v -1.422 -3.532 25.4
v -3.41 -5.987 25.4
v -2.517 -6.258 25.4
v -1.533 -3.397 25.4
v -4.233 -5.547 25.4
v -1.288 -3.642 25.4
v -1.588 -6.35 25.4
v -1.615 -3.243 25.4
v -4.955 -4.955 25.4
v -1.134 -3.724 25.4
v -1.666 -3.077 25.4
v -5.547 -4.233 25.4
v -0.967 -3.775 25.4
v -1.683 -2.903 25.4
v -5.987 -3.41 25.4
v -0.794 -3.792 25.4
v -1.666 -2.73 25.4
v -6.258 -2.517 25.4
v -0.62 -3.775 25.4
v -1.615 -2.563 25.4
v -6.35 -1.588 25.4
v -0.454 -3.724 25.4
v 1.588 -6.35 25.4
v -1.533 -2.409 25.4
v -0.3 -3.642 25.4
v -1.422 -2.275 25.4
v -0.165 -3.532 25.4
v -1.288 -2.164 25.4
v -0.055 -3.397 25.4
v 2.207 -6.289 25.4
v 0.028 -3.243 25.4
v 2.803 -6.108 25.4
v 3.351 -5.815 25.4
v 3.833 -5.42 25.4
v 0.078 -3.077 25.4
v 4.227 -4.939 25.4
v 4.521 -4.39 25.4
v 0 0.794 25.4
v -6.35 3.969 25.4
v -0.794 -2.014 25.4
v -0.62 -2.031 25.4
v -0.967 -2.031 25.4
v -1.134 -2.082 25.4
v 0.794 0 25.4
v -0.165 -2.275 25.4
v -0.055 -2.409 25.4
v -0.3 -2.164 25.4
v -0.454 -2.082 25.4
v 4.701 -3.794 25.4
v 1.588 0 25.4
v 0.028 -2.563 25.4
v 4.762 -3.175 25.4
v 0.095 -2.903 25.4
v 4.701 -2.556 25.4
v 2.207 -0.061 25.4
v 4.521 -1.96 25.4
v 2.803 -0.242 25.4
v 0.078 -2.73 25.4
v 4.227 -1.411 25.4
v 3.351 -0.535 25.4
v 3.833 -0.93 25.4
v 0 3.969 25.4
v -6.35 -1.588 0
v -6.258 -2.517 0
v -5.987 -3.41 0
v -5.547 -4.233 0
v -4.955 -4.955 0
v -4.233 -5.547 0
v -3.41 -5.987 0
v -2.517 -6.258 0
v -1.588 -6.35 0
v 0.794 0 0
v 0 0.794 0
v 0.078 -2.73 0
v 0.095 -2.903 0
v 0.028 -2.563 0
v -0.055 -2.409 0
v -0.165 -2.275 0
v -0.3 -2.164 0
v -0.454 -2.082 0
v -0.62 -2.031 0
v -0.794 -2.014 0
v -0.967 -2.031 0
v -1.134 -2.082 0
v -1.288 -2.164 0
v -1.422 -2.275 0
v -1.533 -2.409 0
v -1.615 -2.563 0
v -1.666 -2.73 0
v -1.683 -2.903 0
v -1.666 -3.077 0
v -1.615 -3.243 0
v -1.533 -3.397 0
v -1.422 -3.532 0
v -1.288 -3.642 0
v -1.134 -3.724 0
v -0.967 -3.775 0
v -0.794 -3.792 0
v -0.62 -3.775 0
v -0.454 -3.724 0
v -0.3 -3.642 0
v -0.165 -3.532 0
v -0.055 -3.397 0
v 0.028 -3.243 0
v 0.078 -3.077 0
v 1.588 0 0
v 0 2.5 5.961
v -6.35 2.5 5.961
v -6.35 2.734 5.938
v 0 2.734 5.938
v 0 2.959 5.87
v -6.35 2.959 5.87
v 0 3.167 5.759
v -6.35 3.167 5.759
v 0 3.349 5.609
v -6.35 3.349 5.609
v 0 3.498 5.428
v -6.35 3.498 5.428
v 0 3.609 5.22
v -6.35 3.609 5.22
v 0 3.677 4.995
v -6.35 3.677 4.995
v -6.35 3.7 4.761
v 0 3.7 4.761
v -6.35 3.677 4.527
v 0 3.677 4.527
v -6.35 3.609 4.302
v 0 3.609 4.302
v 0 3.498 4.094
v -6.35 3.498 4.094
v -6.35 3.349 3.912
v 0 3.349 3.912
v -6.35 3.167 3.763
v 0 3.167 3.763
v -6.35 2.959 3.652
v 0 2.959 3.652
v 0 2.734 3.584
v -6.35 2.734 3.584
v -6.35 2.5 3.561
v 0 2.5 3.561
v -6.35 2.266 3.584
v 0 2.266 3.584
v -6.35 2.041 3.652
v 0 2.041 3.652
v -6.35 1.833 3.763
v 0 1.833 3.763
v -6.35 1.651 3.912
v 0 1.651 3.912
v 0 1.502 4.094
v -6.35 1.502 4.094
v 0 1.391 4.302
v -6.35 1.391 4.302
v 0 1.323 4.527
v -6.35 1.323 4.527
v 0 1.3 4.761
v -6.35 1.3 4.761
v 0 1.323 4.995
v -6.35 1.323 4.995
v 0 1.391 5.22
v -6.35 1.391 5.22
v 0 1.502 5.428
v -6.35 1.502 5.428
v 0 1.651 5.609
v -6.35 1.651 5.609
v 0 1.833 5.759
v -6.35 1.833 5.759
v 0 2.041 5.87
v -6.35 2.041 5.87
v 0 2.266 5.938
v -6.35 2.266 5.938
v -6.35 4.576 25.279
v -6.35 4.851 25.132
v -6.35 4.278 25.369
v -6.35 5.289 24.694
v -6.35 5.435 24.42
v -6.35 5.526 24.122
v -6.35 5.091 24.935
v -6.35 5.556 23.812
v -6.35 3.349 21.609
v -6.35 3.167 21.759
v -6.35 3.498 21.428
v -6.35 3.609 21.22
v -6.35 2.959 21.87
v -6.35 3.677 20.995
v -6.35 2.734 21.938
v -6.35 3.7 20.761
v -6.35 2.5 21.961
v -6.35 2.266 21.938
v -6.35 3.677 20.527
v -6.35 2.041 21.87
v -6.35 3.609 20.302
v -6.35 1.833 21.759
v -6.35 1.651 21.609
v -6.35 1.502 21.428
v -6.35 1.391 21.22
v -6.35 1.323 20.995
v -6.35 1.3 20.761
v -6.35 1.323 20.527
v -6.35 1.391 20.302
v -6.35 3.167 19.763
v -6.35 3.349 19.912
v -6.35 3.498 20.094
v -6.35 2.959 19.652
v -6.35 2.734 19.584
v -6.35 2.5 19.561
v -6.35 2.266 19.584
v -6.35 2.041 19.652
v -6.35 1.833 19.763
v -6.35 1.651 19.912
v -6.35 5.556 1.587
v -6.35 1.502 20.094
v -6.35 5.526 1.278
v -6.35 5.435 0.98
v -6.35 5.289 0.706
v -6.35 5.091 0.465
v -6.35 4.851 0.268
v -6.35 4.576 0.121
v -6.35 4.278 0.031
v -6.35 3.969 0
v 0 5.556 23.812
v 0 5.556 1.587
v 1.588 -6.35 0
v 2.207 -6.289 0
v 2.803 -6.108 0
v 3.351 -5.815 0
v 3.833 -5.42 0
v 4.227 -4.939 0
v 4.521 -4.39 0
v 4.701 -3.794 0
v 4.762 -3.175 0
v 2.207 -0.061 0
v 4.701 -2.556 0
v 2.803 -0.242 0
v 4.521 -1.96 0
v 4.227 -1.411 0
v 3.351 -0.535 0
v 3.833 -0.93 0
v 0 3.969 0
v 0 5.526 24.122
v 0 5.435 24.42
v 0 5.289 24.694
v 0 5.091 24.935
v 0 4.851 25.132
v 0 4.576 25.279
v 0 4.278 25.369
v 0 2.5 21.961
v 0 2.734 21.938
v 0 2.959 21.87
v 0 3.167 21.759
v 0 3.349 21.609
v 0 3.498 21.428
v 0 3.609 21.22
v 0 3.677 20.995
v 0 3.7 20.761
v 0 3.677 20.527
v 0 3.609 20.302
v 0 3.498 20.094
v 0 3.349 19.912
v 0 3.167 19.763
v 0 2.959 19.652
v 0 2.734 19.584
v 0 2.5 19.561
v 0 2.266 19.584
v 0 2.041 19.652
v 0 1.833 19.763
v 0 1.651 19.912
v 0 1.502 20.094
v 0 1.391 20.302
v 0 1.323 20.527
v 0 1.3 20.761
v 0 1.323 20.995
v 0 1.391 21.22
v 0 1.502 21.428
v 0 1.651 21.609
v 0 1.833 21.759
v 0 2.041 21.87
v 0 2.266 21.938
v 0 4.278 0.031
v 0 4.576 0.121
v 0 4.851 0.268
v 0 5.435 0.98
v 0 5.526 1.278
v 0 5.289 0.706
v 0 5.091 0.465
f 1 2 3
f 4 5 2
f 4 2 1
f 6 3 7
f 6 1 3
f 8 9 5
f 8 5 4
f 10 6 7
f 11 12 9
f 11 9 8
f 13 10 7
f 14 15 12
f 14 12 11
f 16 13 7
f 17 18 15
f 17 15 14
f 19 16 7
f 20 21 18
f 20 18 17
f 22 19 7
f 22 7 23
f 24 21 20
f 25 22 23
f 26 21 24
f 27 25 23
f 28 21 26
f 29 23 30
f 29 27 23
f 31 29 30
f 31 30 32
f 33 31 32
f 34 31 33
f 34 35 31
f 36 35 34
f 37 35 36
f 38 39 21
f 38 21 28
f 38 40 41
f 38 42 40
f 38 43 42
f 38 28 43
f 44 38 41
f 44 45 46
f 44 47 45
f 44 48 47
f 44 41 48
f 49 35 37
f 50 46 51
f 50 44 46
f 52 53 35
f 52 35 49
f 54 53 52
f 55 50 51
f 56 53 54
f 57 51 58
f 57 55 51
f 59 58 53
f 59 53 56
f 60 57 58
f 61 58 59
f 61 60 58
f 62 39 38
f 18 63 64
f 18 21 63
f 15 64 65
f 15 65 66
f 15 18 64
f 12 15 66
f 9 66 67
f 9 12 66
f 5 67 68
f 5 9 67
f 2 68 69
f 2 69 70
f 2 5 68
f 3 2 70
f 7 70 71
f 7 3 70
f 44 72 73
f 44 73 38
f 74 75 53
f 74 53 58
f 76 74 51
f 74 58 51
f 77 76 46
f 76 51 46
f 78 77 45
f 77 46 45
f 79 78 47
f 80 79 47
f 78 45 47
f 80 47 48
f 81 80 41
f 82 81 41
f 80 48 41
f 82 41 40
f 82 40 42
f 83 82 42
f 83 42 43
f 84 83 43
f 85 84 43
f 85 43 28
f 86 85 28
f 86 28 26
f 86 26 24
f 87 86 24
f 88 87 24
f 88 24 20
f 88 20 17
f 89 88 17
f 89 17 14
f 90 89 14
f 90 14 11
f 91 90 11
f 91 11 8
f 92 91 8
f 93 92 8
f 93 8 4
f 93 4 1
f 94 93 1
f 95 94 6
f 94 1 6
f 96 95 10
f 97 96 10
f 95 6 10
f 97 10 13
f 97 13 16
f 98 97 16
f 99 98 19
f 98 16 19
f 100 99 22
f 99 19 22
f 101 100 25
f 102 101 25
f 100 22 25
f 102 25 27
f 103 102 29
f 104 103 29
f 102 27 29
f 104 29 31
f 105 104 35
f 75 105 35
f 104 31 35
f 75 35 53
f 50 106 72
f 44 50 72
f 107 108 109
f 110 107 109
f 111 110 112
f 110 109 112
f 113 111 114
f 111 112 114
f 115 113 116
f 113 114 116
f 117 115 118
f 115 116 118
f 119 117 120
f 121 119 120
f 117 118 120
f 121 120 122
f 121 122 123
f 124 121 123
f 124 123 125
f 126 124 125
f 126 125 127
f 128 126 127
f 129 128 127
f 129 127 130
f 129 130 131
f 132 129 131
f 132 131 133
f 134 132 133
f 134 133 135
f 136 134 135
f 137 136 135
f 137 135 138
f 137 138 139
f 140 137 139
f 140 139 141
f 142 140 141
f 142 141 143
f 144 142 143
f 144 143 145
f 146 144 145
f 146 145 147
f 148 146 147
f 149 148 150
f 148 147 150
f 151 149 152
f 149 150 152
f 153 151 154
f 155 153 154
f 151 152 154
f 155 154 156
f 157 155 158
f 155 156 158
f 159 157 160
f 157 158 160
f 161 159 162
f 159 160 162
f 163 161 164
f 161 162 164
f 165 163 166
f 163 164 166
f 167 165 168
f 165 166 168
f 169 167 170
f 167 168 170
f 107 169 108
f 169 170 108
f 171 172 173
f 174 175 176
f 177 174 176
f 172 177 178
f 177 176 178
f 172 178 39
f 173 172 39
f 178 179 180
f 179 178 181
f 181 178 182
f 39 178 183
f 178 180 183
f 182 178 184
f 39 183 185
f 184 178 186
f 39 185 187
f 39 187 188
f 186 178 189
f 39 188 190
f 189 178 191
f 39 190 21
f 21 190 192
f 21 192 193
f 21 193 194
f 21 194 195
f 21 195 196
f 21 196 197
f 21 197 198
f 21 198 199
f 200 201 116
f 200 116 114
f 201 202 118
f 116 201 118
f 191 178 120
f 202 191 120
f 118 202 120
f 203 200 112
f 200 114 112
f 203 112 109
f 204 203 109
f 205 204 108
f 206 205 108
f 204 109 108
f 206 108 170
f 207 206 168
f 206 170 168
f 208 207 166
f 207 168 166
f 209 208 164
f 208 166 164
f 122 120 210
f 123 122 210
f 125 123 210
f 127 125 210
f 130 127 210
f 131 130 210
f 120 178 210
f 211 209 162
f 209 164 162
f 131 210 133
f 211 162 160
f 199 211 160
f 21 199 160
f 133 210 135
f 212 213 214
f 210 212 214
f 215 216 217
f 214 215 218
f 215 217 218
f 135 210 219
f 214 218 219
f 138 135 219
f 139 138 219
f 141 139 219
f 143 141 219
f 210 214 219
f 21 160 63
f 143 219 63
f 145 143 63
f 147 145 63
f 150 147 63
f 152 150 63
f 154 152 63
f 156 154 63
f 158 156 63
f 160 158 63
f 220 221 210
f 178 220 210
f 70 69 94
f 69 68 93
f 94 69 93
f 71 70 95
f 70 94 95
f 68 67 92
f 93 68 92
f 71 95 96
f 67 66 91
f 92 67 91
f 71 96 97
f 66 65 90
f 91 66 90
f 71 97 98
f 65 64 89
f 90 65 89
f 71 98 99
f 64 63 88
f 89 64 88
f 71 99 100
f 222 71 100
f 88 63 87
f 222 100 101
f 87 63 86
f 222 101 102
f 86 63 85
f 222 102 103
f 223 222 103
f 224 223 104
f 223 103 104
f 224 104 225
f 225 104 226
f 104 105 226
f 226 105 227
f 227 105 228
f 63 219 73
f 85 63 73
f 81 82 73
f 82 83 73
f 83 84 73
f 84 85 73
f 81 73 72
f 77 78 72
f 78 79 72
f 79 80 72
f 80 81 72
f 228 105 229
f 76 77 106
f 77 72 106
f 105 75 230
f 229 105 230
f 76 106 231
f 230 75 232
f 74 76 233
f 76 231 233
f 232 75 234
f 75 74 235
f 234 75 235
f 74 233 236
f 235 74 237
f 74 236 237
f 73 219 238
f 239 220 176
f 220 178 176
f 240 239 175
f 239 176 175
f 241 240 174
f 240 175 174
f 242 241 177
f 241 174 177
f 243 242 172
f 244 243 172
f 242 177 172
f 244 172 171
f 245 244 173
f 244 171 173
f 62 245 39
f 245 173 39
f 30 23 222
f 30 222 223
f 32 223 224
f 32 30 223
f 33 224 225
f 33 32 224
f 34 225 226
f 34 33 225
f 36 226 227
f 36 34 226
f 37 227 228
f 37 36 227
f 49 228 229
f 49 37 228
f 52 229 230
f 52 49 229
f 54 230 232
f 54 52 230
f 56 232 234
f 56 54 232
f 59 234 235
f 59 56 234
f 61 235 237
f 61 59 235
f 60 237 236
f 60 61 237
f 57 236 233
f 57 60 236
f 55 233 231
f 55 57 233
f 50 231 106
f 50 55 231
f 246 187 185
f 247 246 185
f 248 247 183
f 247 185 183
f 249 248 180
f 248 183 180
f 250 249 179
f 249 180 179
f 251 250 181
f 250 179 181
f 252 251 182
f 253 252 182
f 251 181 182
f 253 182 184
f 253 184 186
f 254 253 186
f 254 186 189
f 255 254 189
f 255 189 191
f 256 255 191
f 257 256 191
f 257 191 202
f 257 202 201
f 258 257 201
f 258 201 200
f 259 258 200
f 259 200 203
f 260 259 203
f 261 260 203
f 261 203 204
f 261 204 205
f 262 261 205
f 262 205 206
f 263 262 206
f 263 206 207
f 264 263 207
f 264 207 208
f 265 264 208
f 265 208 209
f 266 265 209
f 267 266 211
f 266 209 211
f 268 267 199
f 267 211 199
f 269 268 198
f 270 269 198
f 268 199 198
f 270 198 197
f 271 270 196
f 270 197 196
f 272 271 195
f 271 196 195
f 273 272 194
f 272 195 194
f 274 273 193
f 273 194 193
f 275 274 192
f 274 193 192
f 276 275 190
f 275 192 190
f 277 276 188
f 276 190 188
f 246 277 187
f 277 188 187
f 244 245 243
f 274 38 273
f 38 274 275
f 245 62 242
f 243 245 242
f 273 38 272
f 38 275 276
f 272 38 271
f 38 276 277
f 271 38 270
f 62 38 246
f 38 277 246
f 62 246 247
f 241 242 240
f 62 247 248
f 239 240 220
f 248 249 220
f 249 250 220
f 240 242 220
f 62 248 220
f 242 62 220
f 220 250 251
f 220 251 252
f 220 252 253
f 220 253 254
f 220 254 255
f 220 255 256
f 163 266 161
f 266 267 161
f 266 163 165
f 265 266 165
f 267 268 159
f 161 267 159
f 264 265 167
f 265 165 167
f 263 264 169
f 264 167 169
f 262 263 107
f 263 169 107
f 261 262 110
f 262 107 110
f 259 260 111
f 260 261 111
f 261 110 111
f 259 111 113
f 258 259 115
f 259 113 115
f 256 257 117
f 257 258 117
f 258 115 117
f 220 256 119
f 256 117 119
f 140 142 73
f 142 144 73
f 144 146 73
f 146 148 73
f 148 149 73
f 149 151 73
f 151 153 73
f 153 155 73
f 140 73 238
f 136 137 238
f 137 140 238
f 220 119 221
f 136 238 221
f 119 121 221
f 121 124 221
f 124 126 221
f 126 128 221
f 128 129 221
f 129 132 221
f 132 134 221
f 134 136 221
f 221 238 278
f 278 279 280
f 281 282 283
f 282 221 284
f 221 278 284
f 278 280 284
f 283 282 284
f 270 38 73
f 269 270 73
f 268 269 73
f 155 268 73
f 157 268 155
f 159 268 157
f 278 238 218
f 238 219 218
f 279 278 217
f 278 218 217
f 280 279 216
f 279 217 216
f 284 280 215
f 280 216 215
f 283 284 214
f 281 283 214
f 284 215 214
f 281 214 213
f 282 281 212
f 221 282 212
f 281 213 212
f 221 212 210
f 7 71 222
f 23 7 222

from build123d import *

# Parameters (mm, degrees)
BOSS_EXTRUDE1_DEPTH  = 25.4
CHAMFER1_SIZE        = 0.79375
SKETCH2_R            = 0.889
CUT_EXTRUDE1_DEPTH   = 27.940768363
M2_CLEARANCE_HOLE1_D = 2.4
FILLET1_RADIUS       = 3.175
FILLET1_LENGTH       = 25.4
FILLET2_R            = 4.7625
FILLET3_R            = 1.5875


with BuildPart() as part:
    # Sketch1 → Boss-Extrude1 (new body)
    with BuildSketch(Plane.XY):
        Polygon((0, 0), (0, 5.55625), (-6.35, 5.55625), (-6.35, -6.35), (4.7625, -6.35), (4.7625, 0), align=None)
    extrude(amount=BOSS_EXTRUDE1_DEPTH)

    # Chamfer1
    chamfer1_edges = [part.edges().sort_by_distance(p)[0] for p in [
        (0, 0, 12.7),
    ]]
    chamfer(chamfer1_edges, length=CHAMFER1_SIZE)

    # Sketch2 → Cut-Extrude1 (cut, through all)
    with BuildSketch(Plane.XY.offset(25.4)):
        with Locations((-0.79375, -2.90315)):
            Circle(SKETCH2_R)
    extrude(amount=-CUT_EXTRUDE1_DEPTH, mode=Mode.SUBTRACT)

    # M2 Clearance Hole1 (through all)
    with Locations(Plane(origin=(0, 0, 0), x_dir=(0, 0, -1), z_dir=(1, 0, 0))):
        with Locations((-20.7609375, 2.5), (-4.7609375, 2.5)):
            Hole(M2_CLEARANCE_HOLE1_D / 2)

    # Fillet1: full round fillet: the end face becomes a half cylinder, R = half its width
    fillet1_face = Plane((4.7625, -3.175, 12.7), x_dir=(0, 0, 1), z_dir=(1, 0, 0))  # on the end face: x along it, z out of the body
    fillet1_slab = fillet1_face.offset(-FILLET1_RADIUS / 2) * Box(FILLET1_LENGTH, 2 * FILLET1_RADIUS, FILLET1_RADIUS, mode=Mode.PRIVATE)  # the body's end, R deep
    fillet1_round = Plane((1.5875, -3.175, 12.7), x_dir=(1, 0, 0), z_dir=(0, 0, 1)) * Cylinder(FILLET1_RADIUS, FILLET1_LENGTH, mode=Mode.PRIVATE)  # its axis R under the face
    add(fillet1_slab - fillet1_round, mode=Mode.SUBTRACT)

    # Fillet2
    fillet2_edges = [part.edges().sort_by_distance(p)[0] for p in [
        (-6.35, -6.35, 12.7),
    ]]
    fillet(fillet2_edges, radius=FILLET2_R)

    # Fillet3
    fillet3_edges = [part.edges().sort_by_distance(p)[0] for p in [
        (-3.175, 5.55625, 25.4),
        (-3.175, 5.55625, 0),
    ]]
    fillet(fillet3_edges, radius=FILLET3_R)


solid = part.part
